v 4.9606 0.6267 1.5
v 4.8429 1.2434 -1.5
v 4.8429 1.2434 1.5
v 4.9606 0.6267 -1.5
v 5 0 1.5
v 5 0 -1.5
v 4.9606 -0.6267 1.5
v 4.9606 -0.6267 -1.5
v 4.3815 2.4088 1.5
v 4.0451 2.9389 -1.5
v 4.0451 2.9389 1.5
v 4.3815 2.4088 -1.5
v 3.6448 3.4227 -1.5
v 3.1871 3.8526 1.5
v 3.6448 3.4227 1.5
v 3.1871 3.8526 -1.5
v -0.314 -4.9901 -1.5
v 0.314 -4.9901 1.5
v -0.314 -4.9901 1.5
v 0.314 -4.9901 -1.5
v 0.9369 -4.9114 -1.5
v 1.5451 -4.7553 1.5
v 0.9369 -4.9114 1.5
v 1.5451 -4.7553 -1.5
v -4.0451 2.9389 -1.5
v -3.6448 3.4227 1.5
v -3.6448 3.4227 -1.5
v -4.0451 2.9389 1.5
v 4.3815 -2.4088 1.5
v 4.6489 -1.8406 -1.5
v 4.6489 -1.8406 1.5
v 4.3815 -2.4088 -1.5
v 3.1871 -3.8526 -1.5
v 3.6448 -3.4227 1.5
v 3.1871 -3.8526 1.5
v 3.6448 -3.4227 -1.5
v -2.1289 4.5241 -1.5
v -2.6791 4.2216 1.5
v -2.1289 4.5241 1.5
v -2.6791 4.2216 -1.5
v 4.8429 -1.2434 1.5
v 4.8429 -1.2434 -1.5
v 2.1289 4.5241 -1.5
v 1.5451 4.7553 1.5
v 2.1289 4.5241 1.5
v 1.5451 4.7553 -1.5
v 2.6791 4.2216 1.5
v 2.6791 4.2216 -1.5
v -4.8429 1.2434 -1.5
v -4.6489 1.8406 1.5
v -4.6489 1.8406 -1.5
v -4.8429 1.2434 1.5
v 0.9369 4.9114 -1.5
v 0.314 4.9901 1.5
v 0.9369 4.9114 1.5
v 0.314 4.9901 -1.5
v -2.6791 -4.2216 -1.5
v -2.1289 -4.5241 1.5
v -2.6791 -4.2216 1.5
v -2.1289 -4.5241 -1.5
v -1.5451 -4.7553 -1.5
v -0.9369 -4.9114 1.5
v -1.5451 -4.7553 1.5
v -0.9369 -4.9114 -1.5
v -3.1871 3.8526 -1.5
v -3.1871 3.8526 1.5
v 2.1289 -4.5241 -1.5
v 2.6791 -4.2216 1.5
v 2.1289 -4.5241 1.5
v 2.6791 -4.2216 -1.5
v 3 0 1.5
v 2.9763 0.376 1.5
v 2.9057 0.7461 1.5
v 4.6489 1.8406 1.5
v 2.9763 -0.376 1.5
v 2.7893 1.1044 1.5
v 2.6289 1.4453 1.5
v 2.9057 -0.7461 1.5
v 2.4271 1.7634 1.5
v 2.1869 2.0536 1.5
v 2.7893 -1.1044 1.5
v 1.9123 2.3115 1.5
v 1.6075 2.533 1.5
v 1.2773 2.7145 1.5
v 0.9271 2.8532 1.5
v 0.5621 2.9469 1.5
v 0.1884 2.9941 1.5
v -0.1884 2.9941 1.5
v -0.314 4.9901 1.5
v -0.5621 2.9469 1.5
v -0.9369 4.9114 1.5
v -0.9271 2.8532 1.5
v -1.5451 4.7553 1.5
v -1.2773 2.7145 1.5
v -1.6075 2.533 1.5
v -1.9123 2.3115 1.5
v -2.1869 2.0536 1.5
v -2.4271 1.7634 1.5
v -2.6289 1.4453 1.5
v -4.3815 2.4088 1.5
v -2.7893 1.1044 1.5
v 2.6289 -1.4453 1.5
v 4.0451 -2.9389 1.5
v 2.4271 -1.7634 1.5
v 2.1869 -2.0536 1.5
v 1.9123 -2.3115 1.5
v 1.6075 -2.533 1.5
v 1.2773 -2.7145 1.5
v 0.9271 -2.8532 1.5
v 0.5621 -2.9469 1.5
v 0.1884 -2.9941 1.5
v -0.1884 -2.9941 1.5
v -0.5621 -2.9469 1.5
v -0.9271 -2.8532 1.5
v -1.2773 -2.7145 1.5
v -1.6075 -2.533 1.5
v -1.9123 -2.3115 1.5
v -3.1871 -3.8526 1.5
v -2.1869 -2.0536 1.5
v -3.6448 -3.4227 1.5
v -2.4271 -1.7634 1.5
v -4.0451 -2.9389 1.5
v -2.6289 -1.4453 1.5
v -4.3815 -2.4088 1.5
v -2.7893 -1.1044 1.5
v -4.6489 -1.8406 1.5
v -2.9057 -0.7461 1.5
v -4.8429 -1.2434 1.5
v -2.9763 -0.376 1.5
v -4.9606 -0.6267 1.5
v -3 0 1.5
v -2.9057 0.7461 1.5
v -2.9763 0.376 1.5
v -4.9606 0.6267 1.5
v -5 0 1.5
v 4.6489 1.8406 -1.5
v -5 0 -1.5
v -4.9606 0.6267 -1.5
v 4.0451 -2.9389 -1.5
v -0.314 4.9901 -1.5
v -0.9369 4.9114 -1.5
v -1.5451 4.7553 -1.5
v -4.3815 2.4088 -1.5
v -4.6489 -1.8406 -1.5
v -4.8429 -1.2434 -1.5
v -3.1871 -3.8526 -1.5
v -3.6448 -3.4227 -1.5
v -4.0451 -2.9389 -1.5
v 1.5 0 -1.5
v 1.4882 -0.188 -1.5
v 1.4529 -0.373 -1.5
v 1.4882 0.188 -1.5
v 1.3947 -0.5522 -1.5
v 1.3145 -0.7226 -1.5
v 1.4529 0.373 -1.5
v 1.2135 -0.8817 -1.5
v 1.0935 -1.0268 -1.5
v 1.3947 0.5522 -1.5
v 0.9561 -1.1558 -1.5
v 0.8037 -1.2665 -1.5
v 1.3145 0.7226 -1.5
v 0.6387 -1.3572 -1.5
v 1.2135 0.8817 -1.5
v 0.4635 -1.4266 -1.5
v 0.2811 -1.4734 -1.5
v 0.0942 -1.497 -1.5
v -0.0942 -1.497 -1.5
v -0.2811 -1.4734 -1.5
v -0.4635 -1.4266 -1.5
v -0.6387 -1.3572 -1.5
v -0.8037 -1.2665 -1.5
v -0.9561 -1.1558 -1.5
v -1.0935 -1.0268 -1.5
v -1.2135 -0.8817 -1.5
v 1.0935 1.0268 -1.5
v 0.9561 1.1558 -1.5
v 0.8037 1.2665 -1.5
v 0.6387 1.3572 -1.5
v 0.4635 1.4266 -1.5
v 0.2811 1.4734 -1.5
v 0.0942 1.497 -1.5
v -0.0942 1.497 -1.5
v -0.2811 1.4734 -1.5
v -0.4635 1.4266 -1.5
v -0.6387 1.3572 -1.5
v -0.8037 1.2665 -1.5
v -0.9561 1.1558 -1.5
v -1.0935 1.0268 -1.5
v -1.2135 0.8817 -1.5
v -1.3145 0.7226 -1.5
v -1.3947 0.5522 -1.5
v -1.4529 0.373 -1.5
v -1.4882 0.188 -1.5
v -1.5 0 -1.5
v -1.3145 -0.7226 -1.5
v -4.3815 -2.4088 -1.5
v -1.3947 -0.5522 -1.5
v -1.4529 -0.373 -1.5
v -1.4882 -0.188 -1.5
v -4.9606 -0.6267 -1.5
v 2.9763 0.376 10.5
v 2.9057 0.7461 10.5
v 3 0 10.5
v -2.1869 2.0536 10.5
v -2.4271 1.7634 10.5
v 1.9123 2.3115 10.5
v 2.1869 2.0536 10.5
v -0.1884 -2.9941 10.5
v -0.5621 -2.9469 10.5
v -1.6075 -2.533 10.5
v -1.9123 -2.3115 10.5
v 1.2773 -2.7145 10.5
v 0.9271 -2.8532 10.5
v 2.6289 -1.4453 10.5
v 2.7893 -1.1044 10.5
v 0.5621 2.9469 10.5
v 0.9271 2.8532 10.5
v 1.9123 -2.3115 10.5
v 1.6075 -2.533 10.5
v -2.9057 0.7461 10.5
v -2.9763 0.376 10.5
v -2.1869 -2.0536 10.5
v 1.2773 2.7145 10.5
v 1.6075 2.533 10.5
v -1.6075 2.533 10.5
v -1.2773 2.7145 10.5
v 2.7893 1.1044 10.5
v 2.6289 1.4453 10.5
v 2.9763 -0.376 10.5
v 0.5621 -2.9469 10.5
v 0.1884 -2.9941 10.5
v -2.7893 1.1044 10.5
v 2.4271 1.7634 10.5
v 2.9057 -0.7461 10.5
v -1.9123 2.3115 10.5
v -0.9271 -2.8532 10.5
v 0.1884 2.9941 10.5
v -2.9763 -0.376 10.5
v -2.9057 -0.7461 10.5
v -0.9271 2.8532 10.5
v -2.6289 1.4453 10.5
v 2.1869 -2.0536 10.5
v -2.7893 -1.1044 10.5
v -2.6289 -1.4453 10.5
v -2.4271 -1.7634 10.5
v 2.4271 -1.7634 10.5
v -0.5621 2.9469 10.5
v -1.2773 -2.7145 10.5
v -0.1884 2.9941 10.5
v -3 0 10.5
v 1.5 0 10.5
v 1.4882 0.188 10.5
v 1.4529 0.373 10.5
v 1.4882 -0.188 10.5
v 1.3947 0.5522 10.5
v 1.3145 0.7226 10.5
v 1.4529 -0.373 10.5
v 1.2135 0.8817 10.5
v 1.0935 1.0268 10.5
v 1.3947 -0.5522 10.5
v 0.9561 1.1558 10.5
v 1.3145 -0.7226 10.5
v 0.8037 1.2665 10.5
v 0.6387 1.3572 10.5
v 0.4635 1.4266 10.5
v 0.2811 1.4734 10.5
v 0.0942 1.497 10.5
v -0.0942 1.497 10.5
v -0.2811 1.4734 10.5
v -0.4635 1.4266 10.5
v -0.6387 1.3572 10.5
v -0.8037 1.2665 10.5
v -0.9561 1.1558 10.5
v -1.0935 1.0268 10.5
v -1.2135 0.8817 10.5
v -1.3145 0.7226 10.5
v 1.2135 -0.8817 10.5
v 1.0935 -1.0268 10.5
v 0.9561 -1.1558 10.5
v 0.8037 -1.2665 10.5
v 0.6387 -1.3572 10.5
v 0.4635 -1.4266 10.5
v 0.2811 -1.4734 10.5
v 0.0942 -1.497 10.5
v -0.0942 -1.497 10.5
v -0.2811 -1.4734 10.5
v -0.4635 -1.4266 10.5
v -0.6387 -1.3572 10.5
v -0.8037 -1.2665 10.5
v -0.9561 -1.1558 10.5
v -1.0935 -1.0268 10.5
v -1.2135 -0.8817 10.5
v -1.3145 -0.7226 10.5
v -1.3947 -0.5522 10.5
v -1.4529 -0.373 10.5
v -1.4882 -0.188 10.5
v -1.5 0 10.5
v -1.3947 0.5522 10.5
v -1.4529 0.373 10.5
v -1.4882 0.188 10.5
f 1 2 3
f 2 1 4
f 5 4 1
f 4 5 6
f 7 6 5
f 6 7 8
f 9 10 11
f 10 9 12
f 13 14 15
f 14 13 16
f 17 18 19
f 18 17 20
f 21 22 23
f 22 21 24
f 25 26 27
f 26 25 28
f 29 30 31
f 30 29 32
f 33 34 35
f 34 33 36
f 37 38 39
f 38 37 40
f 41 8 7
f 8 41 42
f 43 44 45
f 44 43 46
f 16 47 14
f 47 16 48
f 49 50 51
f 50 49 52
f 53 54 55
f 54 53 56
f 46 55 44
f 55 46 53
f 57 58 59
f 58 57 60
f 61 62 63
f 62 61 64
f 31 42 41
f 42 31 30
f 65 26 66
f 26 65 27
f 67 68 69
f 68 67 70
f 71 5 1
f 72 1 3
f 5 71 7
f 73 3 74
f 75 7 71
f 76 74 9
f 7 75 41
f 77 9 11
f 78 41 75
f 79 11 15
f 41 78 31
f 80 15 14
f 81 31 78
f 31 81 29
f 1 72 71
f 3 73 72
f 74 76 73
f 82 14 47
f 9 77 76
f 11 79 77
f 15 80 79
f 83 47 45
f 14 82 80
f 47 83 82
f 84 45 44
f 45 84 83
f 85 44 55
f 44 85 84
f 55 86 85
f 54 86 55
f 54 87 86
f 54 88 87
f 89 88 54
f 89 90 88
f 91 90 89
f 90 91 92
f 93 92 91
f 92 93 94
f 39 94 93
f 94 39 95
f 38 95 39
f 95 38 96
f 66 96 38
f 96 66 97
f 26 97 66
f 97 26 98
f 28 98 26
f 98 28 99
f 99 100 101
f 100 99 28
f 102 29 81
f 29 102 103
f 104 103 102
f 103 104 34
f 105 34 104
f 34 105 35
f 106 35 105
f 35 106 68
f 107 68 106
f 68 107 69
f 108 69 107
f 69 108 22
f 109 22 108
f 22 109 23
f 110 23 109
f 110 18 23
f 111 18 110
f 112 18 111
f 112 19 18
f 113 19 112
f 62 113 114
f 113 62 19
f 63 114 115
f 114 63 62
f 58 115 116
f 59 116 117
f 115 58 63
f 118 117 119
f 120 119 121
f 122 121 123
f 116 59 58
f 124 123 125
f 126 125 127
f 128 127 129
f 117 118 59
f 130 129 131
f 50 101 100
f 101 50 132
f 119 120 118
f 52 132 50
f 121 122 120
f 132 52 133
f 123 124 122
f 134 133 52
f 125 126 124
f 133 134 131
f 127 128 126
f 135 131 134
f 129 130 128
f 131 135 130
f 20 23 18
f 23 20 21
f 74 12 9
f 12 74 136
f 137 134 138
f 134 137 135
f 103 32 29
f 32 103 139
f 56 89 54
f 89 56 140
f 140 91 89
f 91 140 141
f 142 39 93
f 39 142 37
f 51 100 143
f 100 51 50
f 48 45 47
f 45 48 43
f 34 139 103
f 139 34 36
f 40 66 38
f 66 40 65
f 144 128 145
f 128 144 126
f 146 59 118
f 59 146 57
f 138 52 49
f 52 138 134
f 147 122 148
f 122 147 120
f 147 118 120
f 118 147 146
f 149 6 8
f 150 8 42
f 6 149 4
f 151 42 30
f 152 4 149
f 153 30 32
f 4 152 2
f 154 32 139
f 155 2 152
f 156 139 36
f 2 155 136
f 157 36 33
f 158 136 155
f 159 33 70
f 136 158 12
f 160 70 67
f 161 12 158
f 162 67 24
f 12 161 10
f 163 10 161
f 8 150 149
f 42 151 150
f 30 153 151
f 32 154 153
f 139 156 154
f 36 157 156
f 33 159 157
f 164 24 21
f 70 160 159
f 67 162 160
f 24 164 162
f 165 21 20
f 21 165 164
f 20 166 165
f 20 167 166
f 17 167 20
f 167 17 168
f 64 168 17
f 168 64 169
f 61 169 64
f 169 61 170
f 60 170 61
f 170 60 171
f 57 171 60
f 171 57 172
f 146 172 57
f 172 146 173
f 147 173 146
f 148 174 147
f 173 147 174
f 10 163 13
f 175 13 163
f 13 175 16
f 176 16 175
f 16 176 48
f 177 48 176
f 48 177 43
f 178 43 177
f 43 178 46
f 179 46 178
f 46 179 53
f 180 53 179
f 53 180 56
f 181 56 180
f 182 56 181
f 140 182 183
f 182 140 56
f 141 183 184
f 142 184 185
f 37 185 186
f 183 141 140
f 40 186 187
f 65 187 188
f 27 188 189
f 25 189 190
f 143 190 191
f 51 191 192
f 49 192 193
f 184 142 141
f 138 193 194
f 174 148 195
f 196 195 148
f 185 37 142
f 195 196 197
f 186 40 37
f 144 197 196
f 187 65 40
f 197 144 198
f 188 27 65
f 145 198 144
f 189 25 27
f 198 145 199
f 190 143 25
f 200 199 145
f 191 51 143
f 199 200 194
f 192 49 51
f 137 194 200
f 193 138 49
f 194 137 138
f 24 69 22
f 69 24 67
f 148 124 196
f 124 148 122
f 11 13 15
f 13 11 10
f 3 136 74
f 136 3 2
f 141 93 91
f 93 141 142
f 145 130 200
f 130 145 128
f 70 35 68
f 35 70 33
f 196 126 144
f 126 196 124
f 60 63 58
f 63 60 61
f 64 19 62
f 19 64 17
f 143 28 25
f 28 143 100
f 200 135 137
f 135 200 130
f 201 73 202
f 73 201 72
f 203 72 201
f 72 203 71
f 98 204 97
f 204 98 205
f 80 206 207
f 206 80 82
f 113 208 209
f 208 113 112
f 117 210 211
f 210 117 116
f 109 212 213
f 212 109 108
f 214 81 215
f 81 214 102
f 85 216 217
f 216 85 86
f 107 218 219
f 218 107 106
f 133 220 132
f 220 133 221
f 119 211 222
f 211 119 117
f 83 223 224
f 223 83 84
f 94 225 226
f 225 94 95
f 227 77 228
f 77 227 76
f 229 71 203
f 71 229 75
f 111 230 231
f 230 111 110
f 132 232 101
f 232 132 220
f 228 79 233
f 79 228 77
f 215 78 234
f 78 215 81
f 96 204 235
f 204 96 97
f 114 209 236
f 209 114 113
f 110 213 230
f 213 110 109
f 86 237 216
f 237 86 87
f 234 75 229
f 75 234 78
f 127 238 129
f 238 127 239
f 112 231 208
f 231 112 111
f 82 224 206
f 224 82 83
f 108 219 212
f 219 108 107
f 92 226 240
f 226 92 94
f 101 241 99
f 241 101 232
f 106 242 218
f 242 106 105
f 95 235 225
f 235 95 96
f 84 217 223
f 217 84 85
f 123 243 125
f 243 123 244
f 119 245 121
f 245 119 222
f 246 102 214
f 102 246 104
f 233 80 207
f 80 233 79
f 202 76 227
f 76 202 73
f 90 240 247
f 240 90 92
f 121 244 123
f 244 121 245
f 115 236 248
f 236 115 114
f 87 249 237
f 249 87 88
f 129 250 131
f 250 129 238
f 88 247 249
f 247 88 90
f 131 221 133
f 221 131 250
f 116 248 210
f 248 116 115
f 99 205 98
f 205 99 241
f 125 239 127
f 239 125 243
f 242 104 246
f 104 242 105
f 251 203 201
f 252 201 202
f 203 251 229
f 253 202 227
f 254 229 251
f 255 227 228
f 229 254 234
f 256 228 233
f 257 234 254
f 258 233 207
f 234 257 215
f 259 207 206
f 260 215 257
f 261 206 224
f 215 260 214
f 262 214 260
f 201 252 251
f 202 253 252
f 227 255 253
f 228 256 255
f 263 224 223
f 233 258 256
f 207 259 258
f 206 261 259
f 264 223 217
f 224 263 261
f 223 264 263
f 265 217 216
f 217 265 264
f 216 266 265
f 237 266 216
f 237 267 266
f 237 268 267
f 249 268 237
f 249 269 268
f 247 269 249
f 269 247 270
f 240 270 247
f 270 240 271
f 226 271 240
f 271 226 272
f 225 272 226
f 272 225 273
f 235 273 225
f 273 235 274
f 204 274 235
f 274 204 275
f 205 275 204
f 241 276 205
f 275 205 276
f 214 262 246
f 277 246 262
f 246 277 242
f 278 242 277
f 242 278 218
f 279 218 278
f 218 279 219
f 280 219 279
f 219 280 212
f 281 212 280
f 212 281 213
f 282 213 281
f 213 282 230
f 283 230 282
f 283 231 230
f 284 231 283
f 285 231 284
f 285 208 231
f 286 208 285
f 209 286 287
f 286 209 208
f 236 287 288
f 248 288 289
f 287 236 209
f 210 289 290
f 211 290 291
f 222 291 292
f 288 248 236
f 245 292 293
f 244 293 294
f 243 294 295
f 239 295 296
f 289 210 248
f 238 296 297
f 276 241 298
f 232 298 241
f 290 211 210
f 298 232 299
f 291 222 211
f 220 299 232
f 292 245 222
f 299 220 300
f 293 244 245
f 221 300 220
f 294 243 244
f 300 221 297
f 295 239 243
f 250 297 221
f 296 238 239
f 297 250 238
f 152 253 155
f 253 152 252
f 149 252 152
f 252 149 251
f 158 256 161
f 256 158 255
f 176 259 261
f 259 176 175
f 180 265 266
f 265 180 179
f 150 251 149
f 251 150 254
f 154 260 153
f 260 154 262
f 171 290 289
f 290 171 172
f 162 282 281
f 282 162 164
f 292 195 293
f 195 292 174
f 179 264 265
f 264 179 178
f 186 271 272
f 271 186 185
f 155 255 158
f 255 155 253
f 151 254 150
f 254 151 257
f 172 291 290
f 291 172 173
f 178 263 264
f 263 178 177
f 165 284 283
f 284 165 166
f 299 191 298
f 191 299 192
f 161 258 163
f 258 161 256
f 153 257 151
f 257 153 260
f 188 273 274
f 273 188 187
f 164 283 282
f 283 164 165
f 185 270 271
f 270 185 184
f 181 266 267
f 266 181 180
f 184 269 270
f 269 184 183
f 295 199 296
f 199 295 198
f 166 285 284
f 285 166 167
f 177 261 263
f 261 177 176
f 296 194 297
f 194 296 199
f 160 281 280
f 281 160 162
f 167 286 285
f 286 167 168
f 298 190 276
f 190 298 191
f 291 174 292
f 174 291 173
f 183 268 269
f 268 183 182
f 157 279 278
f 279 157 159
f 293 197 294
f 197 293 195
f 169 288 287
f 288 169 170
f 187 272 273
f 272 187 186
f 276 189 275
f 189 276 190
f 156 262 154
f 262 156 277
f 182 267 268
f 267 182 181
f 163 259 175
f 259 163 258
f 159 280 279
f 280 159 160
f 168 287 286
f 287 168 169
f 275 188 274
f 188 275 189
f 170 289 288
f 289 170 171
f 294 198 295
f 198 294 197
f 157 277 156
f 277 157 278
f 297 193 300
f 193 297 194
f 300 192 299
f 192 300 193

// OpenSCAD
$fn = 50;


difference() {
	union() {
		translate(v = [0, 0, -1.5000000000]) {
			cylinder(h = 3, r = 5.0000000000);
		}
		translate(v = [0, 0, -1.5000000000]) {
			cylinder(h = 12, r = 3.0000000000);
		}
	}
	union() {
		translate(v = [0, 0, -50.0000000000]) {
			cylinder(h = 100, r = 1.5000000000);
		}
	}
}
